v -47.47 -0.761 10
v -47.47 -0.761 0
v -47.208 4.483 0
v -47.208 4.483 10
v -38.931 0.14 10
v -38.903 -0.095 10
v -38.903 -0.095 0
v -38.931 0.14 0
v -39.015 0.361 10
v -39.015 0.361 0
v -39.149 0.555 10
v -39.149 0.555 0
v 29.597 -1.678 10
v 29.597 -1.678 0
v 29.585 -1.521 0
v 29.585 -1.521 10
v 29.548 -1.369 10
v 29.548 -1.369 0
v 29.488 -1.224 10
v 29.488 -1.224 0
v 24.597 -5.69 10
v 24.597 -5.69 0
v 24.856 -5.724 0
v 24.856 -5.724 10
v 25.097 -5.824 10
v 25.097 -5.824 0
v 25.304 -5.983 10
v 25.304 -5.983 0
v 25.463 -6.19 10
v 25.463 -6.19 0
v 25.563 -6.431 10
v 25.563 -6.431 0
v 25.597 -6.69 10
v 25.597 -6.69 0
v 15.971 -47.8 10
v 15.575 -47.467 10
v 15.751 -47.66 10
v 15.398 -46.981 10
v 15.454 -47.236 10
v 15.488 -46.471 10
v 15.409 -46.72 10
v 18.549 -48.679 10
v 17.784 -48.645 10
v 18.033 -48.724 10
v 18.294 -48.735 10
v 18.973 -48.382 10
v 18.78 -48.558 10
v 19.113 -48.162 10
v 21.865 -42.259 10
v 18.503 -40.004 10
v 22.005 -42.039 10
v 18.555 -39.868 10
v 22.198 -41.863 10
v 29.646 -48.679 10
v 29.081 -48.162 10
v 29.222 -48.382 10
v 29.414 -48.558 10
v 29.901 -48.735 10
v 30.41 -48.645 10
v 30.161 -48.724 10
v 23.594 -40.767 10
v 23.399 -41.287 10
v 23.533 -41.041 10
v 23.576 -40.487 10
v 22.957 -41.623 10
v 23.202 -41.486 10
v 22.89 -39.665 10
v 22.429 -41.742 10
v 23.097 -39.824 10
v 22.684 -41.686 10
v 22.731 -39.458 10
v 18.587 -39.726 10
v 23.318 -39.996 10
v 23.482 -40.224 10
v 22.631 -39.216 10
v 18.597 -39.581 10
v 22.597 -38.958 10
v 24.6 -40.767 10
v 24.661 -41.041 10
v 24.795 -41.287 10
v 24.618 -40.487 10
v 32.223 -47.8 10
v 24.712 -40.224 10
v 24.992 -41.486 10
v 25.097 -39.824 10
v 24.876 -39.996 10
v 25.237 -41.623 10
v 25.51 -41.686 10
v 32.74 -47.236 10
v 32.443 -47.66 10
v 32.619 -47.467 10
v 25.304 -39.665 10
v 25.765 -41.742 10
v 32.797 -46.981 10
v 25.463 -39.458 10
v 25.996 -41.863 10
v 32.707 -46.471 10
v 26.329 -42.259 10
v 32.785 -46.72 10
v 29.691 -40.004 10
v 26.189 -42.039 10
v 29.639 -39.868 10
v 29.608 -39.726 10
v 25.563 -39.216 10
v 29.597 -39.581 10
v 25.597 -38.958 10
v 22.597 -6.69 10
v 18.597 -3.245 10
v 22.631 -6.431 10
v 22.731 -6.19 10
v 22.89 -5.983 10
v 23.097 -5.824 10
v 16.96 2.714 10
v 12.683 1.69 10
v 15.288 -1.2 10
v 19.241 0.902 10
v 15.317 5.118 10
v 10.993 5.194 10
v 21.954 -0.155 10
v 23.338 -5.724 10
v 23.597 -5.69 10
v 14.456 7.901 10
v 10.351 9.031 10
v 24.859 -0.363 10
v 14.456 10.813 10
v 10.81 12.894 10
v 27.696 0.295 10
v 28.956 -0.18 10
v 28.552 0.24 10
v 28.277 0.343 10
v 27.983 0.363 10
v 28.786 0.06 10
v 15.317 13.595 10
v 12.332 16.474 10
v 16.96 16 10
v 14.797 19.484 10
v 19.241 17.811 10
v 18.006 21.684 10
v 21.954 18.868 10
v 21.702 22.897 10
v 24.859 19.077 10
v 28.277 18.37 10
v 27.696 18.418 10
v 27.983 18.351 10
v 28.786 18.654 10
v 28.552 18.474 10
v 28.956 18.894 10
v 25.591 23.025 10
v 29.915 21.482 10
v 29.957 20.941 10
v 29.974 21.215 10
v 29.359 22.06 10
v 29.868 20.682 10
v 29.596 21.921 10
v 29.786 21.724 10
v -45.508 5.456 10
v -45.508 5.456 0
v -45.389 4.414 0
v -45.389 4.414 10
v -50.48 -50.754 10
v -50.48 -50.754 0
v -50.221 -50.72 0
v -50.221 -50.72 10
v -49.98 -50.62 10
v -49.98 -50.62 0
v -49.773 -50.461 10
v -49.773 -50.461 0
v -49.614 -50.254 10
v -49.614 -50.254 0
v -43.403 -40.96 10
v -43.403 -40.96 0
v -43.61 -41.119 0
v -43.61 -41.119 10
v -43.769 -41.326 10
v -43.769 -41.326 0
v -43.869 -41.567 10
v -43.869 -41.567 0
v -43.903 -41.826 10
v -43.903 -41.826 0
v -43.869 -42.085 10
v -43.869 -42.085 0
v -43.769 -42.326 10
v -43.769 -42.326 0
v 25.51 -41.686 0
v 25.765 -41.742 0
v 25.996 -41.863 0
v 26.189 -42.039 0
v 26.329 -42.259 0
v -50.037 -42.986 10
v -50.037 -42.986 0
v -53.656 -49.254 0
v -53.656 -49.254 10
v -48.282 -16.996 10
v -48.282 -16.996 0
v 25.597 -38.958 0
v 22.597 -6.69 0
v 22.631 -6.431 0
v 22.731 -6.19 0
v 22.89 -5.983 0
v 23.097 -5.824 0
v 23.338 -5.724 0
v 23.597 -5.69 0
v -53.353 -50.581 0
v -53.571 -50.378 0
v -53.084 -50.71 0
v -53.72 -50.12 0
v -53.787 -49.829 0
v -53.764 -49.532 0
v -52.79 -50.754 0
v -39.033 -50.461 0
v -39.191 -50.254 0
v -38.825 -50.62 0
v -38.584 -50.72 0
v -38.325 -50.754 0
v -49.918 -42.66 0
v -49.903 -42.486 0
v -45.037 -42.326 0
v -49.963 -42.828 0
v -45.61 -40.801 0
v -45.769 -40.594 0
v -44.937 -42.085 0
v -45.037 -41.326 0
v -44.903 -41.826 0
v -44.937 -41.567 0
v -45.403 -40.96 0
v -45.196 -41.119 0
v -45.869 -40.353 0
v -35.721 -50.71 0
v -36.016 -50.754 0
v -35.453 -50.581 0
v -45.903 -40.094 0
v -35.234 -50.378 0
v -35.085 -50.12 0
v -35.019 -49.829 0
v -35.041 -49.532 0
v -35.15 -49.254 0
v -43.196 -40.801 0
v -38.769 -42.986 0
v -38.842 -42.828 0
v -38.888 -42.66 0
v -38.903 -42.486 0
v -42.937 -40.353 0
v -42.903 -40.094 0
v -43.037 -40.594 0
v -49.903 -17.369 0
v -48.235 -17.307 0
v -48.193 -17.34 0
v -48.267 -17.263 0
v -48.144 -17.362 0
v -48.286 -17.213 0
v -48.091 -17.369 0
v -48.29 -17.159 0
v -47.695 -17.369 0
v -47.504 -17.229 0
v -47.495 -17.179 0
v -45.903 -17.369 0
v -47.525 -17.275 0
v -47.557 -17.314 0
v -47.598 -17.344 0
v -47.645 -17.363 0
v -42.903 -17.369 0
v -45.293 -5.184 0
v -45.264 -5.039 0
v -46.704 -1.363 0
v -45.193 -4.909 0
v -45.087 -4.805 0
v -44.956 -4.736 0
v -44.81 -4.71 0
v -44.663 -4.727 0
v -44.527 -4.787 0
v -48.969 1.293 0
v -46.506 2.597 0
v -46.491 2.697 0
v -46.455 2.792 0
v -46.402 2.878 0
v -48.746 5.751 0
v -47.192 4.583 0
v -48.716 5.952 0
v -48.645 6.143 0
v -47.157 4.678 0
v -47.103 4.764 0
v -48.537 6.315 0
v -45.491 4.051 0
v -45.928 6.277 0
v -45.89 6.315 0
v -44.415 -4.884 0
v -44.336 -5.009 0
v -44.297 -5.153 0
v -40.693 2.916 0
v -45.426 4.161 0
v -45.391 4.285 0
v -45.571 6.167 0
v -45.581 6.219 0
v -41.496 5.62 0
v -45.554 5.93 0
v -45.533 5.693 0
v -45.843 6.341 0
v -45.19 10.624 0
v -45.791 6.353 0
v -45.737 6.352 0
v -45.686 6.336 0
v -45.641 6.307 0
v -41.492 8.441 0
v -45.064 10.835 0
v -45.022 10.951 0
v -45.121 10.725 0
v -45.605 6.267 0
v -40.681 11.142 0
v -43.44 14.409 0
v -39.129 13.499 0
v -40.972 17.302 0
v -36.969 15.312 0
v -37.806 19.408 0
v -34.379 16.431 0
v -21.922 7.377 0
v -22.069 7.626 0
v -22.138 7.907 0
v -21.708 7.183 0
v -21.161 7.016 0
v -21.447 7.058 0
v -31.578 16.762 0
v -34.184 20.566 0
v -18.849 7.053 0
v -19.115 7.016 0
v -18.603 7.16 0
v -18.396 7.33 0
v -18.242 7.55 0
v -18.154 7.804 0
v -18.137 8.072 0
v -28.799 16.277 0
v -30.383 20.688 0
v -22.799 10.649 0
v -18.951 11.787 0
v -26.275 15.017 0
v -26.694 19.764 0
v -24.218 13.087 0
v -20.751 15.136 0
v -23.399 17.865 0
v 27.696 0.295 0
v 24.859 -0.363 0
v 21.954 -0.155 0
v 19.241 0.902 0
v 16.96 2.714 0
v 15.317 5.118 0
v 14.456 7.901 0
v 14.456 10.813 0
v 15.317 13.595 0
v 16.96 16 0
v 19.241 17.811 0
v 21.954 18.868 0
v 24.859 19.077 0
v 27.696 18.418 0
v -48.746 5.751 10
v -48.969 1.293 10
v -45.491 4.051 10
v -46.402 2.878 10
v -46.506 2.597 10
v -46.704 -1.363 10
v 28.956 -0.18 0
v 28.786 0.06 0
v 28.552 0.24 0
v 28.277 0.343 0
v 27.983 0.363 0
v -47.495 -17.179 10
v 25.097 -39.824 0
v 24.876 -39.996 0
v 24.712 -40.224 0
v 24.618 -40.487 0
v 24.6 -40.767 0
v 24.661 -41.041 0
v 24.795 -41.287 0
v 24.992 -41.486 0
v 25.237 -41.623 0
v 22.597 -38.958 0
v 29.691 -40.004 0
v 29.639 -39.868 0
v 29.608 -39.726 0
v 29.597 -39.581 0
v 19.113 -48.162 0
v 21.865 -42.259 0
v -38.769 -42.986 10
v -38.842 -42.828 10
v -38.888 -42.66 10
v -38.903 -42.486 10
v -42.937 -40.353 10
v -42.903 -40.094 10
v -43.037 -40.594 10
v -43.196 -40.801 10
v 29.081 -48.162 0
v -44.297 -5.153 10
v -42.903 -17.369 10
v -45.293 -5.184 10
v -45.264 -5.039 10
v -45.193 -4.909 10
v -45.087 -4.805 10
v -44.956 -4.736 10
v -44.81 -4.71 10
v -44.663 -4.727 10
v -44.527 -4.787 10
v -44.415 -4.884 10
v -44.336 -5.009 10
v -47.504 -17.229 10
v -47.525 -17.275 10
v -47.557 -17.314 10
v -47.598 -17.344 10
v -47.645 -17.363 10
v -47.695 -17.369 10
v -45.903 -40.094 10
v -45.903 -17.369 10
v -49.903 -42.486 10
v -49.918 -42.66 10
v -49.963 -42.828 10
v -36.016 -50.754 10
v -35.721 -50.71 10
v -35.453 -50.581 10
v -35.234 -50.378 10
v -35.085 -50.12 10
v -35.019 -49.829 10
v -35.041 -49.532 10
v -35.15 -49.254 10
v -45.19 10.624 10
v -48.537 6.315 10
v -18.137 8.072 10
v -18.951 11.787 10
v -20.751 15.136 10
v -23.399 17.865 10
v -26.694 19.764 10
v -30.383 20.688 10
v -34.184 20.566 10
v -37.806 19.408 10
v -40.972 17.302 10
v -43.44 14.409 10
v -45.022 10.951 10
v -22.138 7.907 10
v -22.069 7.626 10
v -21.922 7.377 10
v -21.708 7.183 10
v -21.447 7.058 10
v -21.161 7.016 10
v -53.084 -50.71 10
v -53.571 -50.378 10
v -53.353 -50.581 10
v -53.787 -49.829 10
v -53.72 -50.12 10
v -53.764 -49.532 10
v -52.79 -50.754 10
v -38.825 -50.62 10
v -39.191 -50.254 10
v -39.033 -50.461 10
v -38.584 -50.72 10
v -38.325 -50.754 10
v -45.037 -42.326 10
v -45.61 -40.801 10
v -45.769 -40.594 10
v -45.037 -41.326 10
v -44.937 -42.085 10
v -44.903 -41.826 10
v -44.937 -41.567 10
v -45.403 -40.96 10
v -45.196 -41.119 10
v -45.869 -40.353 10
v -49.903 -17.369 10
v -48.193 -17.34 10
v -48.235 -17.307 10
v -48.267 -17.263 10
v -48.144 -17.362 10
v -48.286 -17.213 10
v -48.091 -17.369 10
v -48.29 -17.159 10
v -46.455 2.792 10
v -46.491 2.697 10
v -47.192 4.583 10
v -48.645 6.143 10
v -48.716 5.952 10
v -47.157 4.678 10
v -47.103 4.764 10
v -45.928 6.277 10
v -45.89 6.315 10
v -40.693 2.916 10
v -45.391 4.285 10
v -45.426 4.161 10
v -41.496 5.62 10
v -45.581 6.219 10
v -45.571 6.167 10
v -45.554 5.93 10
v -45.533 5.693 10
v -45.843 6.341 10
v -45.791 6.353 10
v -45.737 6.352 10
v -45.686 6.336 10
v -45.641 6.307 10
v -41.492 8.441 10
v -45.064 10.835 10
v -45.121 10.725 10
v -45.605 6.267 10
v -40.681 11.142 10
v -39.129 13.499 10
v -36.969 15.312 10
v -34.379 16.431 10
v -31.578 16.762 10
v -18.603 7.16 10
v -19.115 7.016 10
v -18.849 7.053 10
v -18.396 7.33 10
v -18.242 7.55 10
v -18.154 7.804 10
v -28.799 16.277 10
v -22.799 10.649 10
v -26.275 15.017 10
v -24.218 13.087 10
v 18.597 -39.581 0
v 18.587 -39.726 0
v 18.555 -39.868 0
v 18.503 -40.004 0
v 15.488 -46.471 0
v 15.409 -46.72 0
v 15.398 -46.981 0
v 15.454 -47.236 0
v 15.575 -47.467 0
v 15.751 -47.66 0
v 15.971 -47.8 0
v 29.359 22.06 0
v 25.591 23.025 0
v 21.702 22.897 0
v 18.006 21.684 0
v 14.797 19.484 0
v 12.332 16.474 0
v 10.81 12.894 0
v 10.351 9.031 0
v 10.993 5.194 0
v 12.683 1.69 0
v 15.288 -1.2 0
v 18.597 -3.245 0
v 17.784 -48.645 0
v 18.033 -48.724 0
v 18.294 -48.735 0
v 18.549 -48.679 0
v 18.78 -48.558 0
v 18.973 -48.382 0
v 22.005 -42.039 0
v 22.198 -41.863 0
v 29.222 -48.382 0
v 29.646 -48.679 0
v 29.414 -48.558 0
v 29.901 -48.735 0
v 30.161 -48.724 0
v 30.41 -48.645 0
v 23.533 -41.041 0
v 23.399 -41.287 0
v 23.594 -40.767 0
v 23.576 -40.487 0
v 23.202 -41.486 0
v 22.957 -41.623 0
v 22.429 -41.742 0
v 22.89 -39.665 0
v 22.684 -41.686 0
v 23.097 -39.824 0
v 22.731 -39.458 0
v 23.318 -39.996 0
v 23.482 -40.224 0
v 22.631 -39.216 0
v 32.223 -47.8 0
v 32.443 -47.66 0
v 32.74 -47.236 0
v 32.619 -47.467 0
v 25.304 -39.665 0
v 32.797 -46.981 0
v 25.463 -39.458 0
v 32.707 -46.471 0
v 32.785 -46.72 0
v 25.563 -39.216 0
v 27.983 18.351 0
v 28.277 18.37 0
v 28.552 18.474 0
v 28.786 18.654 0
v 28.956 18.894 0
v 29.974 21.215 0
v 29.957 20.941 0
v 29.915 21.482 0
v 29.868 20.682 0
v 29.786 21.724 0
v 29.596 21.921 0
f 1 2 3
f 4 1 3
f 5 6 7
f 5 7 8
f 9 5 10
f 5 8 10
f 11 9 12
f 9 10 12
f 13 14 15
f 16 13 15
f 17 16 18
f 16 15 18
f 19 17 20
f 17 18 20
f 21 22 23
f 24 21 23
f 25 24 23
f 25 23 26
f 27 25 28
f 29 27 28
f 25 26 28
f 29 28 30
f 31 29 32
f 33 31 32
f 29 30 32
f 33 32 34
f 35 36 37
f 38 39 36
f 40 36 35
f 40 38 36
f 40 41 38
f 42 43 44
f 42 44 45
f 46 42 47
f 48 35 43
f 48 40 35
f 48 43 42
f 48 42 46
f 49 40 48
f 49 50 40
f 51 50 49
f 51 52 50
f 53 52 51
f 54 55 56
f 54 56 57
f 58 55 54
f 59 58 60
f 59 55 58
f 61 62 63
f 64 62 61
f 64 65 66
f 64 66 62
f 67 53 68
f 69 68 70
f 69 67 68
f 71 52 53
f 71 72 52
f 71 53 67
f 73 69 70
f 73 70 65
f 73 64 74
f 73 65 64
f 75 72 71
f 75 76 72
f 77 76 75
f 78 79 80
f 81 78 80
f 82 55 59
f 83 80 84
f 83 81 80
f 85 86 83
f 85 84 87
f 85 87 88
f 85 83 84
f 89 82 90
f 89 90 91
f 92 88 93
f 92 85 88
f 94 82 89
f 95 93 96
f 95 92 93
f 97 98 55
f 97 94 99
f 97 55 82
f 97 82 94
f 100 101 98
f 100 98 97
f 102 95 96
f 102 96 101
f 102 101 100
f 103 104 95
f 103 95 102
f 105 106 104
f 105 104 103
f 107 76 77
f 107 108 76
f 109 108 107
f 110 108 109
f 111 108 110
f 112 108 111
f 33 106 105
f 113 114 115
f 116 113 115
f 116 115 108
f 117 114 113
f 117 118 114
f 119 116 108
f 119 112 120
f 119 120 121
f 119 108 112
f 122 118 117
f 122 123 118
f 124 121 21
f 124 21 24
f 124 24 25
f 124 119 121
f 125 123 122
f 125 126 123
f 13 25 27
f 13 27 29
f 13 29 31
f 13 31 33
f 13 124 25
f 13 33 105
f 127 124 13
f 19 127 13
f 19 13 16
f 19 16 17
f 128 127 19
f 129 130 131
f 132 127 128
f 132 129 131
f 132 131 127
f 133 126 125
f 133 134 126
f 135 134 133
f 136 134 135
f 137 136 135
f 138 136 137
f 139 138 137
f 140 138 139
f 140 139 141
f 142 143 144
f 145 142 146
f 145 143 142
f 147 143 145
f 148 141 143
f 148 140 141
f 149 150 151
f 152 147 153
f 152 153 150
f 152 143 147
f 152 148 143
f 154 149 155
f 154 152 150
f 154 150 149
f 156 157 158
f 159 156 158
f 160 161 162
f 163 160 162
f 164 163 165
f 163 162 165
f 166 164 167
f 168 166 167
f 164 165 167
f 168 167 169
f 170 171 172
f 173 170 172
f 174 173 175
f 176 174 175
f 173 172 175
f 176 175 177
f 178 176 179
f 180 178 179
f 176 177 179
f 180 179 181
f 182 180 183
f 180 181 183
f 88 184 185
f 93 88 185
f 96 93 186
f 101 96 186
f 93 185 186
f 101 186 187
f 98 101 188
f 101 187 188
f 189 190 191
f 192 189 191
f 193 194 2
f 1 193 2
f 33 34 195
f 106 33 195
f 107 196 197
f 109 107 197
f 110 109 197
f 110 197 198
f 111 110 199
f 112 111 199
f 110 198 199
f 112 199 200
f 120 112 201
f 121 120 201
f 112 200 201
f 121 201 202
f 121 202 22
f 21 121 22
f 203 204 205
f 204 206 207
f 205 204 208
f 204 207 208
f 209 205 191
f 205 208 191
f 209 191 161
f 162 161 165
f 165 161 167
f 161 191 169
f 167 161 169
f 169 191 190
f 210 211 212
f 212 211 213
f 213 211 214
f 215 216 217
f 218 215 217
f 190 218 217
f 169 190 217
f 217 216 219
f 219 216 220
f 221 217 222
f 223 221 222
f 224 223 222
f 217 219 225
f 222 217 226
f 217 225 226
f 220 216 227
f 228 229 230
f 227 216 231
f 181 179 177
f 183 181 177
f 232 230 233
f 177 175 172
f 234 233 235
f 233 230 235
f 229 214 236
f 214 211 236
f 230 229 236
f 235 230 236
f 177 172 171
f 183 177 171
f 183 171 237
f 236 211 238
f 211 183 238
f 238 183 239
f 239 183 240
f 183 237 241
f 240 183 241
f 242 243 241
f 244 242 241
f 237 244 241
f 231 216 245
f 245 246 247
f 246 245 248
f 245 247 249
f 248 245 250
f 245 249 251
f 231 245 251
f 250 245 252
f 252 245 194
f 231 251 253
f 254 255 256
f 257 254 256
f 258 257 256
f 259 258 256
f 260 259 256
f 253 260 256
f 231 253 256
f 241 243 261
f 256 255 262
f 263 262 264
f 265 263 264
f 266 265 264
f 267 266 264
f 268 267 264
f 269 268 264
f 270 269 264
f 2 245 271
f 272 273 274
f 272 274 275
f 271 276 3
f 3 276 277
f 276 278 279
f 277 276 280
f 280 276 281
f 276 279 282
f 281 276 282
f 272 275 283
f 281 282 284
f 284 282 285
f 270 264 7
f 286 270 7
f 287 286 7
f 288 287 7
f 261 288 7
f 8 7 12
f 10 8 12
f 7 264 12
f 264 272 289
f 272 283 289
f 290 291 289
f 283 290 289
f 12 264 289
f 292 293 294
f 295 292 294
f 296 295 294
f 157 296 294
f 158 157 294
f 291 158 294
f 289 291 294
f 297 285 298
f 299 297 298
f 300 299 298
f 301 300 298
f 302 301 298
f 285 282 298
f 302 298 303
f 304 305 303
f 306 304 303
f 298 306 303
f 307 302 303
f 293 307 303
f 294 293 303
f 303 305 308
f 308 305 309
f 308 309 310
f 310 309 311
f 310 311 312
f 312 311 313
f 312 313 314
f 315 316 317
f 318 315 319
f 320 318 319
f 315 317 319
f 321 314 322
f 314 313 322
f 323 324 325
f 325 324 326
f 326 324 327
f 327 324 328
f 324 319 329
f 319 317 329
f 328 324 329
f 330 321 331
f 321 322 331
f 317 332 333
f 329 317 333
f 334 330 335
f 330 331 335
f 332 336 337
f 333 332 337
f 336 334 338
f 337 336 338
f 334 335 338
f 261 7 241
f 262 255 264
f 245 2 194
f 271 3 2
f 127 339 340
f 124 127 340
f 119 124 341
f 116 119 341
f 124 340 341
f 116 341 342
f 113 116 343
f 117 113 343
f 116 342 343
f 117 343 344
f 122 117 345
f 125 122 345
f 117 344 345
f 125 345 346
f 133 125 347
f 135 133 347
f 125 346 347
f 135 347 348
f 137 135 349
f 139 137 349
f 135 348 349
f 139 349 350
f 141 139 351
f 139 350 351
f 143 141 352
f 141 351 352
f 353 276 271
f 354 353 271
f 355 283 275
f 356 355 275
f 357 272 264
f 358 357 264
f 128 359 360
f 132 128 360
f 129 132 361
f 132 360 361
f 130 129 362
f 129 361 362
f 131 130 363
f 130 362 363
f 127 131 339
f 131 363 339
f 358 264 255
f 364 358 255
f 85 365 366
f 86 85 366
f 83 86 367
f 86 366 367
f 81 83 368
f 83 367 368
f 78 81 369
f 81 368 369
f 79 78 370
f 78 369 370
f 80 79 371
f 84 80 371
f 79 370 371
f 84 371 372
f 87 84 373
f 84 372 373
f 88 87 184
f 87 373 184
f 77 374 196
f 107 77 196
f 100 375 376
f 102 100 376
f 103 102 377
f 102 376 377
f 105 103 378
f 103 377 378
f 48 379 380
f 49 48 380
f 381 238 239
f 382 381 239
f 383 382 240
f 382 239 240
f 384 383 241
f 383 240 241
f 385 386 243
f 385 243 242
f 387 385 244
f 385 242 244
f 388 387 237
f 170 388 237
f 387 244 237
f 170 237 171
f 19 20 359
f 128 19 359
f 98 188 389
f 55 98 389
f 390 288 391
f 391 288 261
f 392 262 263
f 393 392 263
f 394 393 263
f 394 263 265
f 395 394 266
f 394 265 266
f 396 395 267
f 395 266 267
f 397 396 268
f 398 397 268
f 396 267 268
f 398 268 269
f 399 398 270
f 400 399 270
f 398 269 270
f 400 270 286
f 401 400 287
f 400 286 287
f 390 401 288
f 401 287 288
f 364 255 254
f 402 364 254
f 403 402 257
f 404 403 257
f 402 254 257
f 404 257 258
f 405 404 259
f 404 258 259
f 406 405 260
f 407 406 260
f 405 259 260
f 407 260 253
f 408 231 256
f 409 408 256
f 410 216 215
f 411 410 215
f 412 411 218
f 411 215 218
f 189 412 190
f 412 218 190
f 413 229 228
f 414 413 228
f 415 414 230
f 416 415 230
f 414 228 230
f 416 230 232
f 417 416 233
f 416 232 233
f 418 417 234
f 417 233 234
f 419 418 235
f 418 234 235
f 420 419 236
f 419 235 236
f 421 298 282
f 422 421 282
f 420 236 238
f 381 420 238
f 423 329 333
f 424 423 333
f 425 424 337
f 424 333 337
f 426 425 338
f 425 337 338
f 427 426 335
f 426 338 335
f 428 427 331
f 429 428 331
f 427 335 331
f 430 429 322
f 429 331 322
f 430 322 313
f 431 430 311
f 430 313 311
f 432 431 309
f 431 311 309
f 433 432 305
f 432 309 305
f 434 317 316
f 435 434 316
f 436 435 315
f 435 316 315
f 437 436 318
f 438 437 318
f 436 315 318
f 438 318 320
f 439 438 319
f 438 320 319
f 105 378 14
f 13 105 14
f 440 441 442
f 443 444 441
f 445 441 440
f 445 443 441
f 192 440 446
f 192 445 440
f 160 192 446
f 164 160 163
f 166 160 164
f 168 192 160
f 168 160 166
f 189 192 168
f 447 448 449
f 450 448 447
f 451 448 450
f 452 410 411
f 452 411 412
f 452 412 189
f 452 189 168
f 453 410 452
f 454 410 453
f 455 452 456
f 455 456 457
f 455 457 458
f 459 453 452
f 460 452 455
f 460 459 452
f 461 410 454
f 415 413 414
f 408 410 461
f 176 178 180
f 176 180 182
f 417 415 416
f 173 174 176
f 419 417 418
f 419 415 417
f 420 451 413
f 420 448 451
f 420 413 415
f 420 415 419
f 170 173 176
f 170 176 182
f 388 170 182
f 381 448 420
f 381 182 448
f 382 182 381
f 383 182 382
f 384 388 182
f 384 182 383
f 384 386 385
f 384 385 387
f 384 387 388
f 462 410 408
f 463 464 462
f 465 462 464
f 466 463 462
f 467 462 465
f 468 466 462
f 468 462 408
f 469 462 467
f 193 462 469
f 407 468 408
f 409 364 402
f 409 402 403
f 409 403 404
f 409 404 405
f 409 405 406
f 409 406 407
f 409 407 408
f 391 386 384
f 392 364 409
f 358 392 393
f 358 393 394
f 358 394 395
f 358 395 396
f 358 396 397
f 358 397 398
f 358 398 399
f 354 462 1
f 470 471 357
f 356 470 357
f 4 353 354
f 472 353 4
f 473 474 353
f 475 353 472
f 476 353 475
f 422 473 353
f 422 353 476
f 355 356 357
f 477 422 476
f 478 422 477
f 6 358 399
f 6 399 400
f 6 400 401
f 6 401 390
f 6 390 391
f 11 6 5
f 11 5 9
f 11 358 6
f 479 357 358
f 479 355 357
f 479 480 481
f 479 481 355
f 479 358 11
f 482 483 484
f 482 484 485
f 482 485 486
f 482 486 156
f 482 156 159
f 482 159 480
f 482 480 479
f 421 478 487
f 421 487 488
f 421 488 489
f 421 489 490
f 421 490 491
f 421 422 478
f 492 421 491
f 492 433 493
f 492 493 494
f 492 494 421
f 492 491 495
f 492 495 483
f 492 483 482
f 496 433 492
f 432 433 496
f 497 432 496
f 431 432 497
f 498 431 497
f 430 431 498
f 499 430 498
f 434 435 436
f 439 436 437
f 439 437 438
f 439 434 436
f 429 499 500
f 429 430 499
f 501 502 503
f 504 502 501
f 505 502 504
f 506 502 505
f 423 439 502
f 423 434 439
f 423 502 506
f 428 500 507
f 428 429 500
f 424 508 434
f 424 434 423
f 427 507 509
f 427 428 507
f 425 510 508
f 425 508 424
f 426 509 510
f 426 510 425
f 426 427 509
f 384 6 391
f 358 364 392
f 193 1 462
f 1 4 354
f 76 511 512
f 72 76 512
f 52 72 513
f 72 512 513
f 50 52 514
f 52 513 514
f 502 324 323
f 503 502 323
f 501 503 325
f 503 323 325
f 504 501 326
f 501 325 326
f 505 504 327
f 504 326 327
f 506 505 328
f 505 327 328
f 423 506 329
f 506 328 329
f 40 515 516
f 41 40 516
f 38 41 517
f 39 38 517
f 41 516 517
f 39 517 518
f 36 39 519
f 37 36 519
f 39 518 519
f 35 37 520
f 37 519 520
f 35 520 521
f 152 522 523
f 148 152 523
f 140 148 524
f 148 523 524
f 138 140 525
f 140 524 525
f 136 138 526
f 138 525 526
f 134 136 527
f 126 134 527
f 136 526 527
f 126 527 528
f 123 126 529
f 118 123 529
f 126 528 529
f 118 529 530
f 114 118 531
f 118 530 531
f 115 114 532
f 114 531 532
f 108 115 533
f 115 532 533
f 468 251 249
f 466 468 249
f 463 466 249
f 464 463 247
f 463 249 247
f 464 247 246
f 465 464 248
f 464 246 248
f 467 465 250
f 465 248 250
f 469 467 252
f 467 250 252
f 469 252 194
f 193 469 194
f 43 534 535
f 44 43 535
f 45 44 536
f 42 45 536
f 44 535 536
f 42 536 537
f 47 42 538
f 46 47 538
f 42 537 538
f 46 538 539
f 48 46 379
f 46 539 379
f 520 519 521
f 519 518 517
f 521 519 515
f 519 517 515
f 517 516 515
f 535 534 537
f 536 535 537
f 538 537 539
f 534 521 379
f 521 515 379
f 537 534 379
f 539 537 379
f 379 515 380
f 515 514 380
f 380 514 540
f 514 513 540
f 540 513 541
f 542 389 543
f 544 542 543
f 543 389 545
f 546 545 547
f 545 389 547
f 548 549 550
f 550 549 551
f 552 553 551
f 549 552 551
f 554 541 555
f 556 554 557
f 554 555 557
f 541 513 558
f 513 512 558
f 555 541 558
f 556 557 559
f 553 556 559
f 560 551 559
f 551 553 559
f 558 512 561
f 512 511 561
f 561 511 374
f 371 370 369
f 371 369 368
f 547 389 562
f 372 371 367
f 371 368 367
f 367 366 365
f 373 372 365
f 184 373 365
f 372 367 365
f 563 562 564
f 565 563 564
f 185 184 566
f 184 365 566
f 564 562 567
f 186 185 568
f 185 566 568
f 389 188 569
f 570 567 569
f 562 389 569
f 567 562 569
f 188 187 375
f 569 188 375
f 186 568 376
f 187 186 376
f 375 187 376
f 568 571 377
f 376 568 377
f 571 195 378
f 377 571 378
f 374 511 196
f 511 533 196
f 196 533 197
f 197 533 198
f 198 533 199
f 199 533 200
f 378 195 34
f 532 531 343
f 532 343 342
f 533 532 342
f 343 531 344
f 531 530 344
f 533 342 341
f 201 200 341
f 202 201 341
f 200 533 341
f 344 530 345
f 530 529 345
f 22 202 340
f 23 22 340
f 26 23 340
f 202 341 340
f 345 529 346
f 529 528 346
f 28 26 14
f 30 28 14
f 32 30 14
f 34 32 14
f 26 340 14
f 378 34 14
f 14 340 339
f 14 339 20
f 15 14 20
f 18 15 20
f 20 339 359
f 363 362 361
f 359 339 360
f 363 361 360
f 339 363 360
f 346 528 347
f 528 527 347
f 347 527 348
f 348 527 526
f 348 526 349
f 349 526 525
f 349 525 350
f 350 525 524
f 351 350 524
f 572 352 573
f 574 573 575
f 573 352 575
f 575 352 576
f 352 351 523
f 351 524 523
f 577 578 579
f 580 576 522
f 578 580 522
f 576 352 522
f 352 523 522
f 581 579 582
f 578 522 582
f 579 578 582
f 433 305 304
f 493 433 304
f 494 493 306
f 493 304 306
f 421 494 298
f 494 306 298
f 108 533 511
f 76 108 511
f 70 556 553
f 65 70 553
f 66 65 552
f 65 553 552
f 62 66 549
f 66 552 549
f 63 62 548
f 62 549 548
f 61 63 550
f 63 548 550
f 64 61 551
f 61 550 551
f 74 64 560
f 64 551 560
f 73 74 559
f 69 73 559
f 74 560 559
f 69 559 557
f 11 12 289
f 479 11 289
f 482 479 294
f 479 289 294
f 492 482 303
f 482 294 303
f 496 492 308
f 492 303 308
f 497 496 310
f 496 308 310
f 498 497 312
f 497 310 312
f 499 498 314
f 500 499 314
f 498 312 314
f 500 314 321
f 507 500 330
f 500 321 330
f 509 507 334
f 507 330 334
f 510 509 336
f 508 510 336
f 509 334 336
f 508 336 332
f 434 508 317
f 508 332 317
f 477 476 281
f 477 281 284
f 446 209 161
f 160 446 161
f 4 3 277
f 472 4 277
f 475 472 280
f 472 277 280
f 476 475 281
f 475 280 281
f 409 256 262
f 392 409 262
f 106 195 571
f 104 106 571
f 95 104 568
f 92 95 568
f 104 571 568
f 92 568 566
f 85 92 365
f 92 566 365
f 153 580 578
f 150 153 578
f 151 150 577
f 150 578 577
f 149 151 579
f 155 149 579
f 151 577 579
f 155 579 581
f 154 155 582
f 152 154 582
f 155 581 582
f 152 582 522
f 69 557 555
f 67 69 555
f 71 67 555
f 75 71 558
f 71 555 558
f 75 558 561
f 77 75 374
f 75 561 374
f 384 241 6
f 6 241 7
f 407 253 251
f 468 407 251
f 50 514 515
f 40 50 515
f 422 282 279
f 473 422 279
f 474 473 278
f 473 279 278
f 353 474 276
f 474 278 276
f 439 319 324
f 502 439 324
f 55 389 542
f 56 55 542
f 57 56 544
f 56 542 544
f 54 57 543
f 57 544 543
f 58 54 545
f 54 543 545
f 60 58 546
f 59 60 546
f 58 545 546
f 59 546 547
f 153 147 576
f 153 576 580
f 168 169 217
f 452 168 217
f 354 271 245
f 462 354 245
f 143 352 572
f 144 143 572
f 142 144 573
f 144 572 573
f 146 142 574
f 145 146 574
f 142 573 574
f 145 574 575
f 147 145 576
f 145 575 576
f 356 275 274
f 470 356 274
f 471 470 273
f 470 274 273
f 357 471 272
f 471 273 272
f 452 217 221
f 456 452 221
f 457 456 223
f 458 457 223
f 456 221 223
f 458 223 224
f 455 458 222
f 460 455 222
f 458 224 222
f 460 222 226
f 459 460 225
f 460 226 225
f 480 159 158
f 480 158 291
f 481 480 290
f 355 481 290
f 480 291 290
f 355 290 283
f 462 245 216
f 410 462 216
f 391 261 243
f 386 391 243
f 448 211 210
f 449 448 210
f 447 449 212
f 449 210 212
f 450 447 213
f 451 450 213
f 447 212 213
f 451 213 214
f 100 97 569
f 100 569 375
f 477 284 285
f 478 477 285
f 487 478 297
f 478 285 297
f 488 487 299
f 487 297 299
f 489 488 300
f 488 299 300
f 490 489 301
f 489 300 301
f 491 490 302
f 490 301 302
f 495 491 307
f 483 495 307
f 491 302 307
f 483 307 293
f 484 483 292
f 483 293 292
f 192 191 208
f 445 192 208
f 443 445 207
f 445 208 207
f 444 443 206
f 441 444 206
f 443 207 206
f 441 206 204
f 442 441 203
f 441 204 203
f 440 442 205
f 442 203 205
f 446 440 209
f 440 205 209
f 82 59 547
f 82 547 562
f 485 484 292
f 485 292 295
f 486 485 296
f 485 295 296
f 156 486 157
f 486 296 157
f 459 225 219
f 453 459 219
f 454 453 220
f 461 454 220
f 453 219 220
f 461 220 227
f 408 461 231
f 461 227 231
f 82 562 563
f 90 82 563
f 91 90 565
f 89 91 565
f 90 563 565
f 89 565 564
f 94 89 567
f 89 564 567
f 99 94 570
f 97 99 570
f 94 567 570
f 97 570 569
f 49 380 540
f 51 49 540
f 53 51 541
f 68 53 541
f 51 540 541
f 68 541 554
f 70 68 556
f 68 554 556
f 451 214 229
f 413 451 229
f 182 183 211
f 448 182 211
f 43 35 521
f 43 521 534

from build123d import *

# Parameters (mm, degrees)
F1_DEPTH = 10


with BuildPart() as f1:
    # F0 (on Top) → F1 (new body)
    with BuildSketch(Plane.XY):
        with BuildLine():
            ThreePointArc((-39.149014, 0.555049), (-35.714797, 15.965708), (-22.137661, 7.906947))
            ThreePointArc((-22.137661, 7.906947), (-21.822032, 7.272042), (-21.160935, 7.015766))
            Line((-21.160935, 7.015766), (-19.115405, 7.015766))
            ThreePointArc((-19.115405, 7.015766), (-18.395708, 7.330214), (-18.137471, 8.071938))
            ThreePointArc((-18.137471, 8.071938), (-30.38281, 20.687602), (-45.021742, 10.950819))
            ThreePointArc((-45.021742, 10.950819), (-45.090785, 10.779352), (-45.190208, 10.623522))
            Line((-45.190208, 10.623522), (-48.53729, 6.314973))
            ThreePointArc((-48.53729, 6.314973), (-48.685151, 6.049287), (-48.746332, 5.751446))
            Line((-48.746332, 5.751446), (-48.969351, 1.292664))
            Line((-48.969351, 1.292664), (-49.902766, -17.368967))
            Line((-49.902766, -17.368967), (-49.902766, -41.706997))
            Line((-49.902766, -41.706997), (-49.902766, -42.486413))
            ThreePointArc((-49.902766, -42.486413), (-49.93684, -42.745232), (-50.036741, -42.986413))
            Line((-50.036741, -42.986413), (-53.655543, -49.254362))
            ThreePointArc((-53.655543, -49.254362), (-53.655543, -50.254362), (-52.789518, -50.754362))
            Line((-52.789518, -50.754362), (-50.480117, -50.754362))
            ThreePointArc((-50.480117, -50.754362), (-49.980117, -50.620387), (-49.614091, -50.254362))
            Line((-49.614091, -50.254362), (-45.036741, -42.326159))
            ThreePointArc((-45.036741, -42.326159), (-44.93684, -41.56734), (-45.402766, -40.960133))
            ThreePointArc((-45.402766, -40.960133), (-45.768792, -40.594108), (-45.902766, -40.094108))
            Line((-45.902766, -40.094108), (-45.902766, -17.368967))
            Line((-45.902766, -17.368967), (-45.293323, -5.184456))
            ThreePointArc((-45.293323, -5.184456), (-44.809864, -4.709687), (-44.297173, -5.15273))
            Line((-44.297173, -5.15273), (-42.902766, -17.368967))
            Line((-42.902766, -17.368967), (-42.902766, -40.094108))
            ThreePointArc((-42.902766, -40.094108), (-43.036741, -40.594108), (-43.402766, -40.960133))
            ThreePointArc((-43.402766, -40.960133), (-43.868692, -41.56734), (-43.768792, -42.326159))
            Line((-43.768792, -42.326159), (-39.191441, -50.254362))
            ThreePointArc((-39.191441, -50.254362), (-38.825416, -50.620387), (-38.325416, -50.754362))
            Line((-38.325416, -50.754362), (-36.016015, -50.754362))
            ThreePointArc((-36.016015, -50.754362), (-35.14999, -50.254362), (-35.14999, -49.254362))
            Line((-35.14999, -49.254362), (-38.768792, -42.986413))
            ThreePointArc((-38.768792, -42.986413), (-38.868692, -42.745232), (-38.902766, -42.486413))
            Line((-38.902766, -42.486413), (-38.902766, -4.785781))
            Line((-38.902766, -4.785781), (-38.902766, -0.094887))
            ThreePointArc((-38.902766, -0.094887), (-38.966392, 0.252624), (-39.149014, 0.555049))
        make_face()
        with BuildLine():
            Line((-46.704188, -1.363111), (-47.495263, -17.178958))
            ThreePointArc((-47.495263, -17.178958), (-47.557169, -17.313878), (-47.695013, -17.368967))
            Line((-47.695013, -17.368967), (-48.090513, -17.368967))
            ThreePointArc((-48.090513, -17.368967), (-48.235423, -17.306811), (-48.290263, -17.158976))
            Line((-48.290263, -17.158976), (-48.282119, -16.99615))
            Line((-48.282119, -16.99615), (-47.470074, -0.761051))
            Line((-47.470074, -0.761051), (-47.207795, 4.482655))
            ThreePointArc((-47.207795, 4.482655), (-47.177204, 4.631576), (-47.103273, 4.764419))
            Line((-47.103273, 4.764419), (-45.928169, 6.277077))
            ThreePointArc((-45.928169, 6.277077), (-45.71125, 6.345487), (-45.570609, 6.166731))
            ThreePointArc((-45.570609, 6.166731), (-45.54398, 5.811168), (-45.50814, 5.456415))
            Line((-45.50814, 5.456415), (-45.389149, 4.413949))
            ThreePointArc((-45.389149, 4.413949), (-45.404495, 4.222239), (-45.491069, 4.050504))
            Line((-45.491069, 4.050504), (-46.401608, 2.878409))
            ThreePointArc((-46.401608, 2.878409), (-46.475538, 2.745566), (-46.506129, 2.596645))
            Line((-46.506129, 2.596645), (-46.704188, -1.363111))
        make_face(mode=Mode.SUBTRACT)
        with BuildLine():
            Line((23.597122, -5.689668), (24.097122, -5.689668))
            Line((24.097122, -5.689668), (24.597122, -5.689668))
            ThreePointArc((24.597122, -5.689668), (25.304229, -5.982561), (25.597122, -6.689668))
            Line((25.597122, -6.689668), (25.597122, -38.957617))
            ThreePointArc((25.597122, -38.957617), (25.463148, -39.457617), (25.097122, -39.823643))
            ThreePointArc((25.097122, -39.823643), (24.620826, -40.906108), (25.509967, -41.685863))
            ThreePointArc((25.509967, -41.685863), (25.996387, -41.862906), (26.329119, -42.259439))
            Line((26.329119, -42.259439), (29.081416, -48.16176))
            ThreePointArc((29.081416, -48.16176), (29.645704, -48.678834), (30.410342, -48.64545))
            Line((30.410342, -48.64545), (32.222958, -47.800213))
            ThreePointArc((32.222958, -47.800213), (32.740032, -47.235925), (32.706647, -46.471287))
            Line((32.706647, -46.471287), (29.690814, -40.003813))
            ThreePointArc((29.690814, -40.003813), (29.620826, -39.797635), (29.597122, -39.581195))
            Line((29.597122, -39.581195), (29.597122, -5.689668))
            Line((29.597122, -5.689668), (29.597122, -1.677608))
            ThreePointArc((29.597122, -1.677608), (29.569492, -1.444163), (29.488129, -1.223618))
            Line((29.488129, -1.223618), (28.956358, -0.17996))
            ThreePointArc((28.956358, -0.17996), (28.418317, 0.301686), (27.696214, 0.295425))
            ThreePointArc((27.696214, 0.295425), (14.347122, 9.356828), (27.696214, 18.418232))
            ThreePointArc((27.696214, 18.418232), (28.418317, 18.41197), (28.956358, 18.893616))
            Line((28.956358, 18.893616), (29.86767, 20.682166))
            ThreePointArc((29.86767, 20.682166), (29.91486, 21.482261), (29.359373, 22.060026))
            ThreePointArc((29.359373, 22.060026), (11.443924, 14.738191), (18.597122, -3.245255))
            Line((18.597122, -3.245255), (18.597122, -5.689668))
            Line((18.597122, -5.689668), (18.597122, -39.581195))
            ThreePointArc((18.597122, -39.581195), (18.573418, -39.797635), (18.50343, -40.003813))
            Line((18.50343, -40.003813), (15.487597, -46.471287))
            ThreePointArc((15.487597, -46.471287), (15.454213, -47.235925), (15.971287, -47.800213))
            Line((15.971287, -47.800213), (17.783903, -48.64545))
            ThreePointArc((17.783903, -48.64545), (18.548541, -48.678834), (19.112829, -48.16176))
            Line((19.112829, -48.16176), (21.865126, -42.259439))
            ThreePointArc((21.865126, -42.259439), (22.197857, -41.862906), (22.684278, -41.685863))
            ThreePointArc((22.684278, -41.685863), (23.573418, -40.906108), (23.097122, -39.823643))
            ThreePointArc((23.097122, -39.823643), (22.731097, -39.457617), (22.597122, -38.957617))
            Line((22.597122, -38.957617), (22.597122, -6.689668))
            ThreePointArc((22.597122, -6.689668), (22.890015, -5.982561), (23.597122, -5.689668))
        make_face()
    extrude(amount=F1_DEPTH)


solid = f1.part
